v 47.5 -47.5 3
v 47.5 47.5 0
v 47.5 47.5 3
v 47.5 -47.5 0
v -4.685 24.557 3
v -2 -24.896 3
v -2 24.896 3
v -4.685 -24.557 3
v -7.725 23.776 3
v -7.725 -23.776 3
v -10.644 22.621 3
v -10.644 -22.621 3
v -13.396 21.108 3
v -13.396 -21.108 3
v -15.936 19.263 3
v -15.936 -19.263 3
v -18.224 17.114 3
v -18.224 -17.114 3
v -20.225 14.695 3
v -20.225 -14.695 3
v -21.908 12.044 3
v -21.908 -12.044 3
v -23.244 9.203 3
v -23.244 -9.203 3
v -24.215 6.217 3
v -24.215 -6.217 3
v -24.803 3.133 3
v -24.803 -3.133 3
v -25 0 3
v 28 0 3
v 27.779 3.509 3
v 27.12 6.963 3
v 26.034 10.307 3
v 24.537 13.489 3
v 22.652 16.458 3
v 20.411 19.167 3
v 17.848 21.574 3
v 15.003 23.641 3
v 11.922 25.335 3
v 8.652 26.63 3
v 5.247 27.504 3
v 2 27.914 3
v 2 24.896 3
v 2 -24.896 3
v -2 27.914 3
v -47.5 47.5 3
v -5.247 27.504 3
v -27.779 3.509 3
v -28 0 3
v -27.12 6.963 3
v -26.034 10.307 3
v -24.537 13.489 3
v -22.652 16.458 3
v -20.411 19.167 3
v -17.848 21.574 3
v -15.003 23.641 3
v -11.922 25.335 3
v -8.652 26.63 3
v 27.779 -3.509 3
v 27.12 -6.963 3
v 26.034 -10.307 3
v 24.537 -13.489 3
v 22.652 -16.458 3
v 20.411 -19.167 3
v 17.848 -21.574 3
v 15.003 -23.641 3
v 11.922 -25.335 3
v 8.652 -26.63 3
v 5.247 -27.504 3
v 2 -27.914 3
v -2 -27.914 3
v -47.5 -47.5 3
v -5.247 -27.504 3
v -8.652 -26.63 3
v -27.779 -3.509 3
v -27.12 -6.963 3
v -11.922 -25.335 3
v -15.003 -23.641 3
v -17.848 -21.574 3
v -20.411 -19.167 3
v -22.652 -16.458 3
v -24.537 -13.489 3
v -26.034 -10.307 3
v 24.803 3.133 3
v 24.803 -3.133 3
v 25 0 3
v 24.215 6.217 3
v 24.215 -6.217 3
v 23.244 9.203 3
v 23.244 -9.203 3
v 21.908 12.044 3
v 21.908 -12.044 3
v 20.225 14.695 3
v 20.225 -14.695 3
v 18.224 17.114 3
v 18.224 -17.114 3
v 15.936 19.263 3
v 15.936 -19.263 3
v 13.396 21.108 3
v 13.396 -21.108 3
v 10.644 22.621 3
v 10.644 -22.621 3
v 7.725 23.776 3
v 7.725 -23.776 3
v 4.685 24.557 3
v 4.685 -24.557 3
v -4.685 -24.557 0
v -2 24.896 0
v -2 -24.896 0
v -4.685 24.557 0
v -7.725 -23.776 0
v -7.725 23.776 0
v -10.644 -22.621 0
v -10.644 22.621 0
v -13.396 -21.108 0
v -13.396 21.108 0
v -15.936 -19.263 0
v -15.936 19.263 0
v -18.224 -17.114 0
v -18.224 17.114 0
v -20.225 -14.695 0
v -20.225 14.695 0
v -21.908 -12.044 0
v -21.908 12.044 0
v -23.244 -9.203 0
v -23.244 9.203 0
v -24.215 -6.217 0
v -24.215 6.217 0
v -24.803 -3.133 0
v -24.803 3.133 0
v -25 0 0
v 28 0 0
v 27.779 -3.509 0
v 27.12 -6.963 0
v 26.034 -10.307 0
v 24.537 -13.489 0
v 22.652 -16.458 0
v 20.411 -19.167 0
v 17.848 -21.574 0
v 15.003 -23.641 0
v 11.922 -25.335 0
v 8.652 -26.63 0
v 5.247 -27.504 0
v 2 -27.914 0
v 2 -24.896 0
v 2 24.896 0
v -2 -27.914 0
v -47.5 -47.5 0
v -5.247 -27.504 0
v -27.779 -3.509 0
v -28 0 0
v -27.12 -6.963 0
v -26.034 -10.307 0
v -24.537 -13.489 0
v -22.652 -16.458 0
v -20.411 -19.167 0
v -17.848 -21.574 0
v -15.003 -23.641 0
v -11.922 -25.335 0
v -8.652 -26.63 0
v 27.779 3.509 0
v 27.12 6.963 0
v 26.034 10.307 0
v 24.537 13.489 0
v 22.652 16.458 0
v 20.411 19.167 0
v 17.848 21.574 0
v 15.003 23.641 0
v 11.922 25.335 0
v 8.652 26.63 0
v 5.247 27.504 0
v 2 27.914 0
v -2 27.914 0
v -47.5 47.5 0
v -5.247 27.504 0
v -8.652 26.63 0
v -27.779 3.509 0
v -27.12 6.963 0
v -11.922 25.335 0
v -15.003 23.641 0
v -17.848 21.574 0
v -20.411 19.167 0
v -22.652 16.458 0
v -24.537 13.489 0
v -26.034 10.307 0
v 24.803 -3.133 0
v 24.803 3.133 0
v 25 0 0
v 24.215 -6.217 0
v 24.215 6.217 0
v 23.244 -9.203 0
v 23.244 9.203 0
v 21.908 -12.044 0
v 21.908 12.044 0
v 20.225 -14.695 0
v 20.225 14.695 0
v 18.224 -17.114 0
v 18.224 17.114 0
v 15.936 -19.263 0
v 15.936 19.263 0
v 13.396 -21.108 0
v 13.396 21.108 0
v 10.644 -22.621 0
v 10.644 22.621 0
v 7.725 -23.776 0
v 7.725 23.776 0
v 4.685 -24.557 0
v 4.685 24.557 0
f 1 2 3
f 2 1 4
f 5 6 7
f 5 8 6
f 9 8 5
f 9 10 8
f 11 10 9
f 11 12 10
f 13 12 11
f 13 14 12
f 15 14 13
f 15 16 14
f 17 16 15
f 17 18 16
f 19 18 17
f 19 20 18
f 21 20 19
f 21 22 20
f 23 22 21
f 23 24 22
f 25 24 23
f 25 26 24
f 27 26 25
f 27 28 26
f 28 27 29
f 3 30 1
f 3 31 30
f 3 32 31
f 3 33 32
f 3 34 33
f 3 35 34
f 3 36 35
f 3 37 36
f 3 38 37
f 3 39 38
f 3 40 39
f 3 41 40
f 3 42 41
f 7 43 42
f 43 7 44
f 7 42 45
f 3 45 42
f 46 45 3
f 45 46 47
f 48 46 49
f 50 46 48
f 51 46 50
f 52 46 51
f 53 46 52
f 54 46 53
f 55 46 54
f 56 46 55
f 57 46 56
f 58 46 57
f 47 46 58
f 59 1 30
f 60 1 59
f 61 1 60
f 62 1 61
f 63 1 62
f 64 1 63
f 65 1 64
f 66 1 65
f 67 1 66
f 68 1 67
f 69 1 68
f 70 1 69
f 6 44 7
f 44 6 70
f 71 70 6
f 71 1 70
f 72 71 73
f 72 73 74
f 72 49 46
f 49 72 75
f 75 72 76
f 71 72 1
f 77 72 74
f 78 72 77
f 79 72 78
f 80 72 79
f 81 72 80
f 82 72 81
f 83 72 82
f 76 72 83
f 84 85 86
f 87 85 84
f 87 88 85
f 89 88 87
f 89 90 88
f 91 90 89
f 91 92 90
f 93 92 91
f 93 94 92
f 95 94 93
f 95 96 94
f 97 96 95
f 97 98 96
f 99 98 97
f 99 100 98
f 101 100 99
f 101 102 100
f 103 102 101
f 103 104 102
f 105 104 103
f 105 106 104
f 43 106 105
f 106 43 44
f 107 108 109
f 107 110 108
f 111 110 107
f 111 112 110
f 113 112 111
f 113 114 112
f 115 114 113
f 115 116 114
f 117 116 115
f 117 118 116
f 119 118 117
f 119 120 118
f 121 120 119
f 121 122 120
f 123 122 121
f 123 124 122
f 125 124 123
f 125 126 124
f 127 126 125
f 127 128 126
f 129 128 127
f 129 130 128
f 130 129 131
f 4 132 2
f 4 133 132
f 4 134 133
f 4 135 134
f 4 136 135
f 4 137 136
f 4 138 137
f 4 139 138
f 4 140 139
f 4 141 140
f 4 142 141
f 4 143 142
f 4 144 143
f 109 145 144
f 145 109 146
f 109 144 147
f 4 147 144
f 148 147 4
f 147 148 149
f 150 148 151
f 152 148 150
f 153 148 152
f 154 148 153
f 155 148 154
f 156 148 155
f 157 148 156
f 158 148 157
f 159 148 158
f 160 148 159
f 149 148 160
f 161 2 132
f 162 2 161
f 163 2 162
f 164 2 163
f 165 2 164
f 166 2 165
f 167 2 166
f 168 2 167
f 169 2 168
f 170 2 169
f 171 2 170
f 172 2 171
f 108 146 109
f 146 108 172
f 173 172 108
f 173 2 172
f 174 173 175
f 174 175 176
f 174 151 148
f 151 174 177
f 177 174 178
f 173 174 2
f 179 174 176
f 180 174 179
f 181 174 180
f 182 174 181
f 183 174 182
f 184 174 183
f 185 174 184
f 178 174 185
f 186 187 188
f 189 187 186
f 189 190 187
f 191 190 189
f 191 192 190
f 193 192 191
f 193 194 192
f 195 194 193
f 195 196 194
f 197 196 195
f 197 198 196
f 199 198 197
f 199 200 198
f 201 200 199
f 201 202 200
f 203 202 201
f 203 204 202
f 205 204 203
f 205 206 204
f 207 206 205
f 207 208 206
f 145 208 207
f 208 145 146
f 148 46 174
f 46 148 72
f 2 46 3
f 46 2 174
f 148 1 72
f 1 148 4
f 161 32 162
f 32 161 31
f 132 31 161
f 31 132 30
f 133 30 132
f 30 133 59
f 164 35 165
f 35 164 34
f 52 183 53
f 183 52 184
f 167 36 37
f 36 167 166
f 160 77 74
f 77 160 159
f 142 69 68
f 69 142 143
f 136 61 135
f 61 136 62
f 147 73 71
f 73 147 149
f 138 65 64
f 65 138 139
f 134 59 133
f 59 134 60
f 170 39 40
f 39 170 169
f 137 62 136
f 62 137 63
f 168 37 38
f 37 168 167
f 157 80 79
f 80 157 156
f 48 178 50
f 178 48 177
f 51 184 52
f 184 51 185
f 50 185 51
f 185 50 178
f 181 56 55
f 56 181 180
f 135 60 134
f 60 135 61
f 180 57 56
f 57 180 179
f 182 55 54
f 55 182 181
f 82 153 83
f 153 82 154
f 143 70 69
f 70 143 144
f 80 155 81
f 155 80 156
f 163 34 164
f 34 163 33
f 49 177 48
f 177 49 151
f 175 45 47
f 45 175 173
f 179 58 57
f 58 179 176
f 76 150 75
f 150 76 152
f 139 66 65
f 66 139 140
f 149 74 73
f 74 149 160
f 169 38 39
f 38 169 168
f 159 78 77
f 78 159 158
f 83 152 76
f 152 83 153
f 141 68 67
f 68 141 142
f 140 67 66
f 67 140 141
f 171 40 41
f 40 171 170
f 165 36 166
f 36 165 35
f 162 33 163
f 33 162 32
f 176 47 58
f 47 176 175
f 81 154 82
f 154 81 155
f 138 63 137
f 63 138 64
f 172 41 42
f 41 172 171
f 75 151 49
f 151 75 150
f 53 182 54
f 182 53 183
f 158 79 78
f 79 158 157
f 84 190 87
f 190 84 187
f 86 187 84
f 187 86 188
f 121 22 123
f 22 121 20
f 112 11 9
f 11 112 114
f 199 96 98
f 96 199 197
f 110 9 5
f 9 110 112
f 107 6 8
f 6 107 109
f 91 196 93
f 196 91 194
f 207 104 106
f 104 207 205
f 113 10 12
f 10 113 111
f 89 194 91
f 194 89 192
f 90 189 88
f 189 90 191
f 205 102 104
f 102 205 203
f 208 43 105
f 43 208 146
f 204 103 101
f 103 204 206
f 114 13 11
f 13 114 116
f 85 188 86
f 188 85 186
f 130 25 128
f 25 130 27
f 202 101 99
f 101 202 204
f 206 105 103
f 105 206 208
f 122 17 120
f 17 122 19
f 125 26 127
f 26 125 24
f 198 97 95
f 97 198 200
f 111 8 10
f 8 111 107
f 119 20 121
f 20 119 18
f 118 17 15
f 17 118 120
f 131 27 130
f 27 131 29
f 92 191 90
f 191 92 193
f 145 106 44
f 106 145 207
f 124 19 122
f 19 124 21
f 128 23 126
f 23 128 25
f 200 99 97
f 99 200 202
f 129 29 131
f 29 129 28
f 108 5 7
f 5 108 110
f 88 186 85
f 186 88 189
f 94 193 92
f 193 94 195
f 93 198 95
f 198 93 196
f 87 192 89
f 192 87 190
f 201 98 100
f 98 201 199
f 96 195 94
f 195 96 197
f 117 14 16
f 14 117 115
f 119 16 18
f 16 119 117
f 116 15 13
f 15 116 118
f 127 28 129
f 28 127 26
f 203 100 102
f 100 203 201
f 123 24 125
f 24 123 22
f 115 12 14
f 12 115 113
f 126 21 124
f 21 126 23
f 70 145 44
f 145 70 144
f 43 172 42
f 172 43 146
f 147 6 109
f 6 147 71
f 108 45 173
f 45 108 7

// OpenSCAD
wh = 95; // width/height of base plate

d = 3; //Depth of baseplate
wsep = 4; //width of separator

inD = 50; //Inner circle diameter
ouD = 56; //Outer circle diameter

$fn=50; // Resolution - increase to get nicer circle. Will slow down rendering time significantly. The stl file is set to 150
union(){
    difference(){
        //baseplate
        translate([0,0,d*.5])cube([wh,wh,d],center =true);
    
           //Subtracting outer circle
        cylinder(d,ouD*.5,ouD*.5);
        
    };
    //adding inner circle
    cylinder(d,inD*.5,inD*.5);
    
    //adding separator for holding togehter pieces
    translate([0,0,d*.5])cube([wsep,wh,d],center =true);
    
};
